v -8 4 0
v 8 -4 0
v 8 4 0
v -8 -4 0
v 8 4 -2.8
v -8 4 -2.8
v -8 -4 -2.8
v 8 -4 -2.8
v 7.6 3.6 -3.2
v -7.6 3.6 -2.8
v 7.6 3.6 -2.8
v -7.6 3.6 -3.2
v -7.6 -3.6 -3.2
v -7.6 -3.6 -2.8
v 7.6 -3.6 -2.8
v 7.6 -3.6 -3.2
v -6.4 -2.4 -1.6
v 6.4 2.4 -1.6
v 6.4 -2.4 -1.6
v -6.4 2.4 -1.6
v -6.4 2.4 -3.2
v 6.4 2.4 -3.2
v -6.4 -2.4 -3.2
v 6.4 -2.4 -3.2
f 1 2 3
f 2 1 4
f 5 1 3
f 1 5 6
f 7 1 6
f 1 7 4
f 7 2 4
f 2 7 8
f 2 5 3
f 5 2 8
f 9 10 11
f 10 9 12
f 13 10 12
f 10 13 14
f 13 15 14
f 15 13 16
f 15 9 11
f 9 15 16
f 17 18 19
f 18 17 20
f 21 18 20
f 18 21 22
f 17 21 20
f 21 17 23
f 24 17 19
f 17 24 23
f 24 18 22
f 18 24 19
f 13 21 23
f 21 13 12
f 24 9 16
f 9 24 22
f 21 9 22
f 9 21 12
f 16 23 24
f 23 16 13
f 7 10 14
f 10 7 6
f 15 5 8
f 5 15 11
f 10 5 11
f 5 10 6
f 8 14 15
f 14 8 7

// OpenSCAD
// file: ../p/box5.scad
use <../lib.scad>
function ldraw_lib__box5() = [
// 0 Box with 5 Faces and All Edges
// 0 Name: box5.dat
// 0 Author: James Jessiman
// 0 !LDRAW_ORG Primitive UPDATE 2012-01
// 0 !LICENSE Licensed under CC BY 4.0 : see CAreadme.txt
// 
// 0 BFC CERTIFY CCW
  [0,"BFC","CERTIFY"],
  [0,"BFC","CCW"],
// 
// 0 !HISTORY 2002-04-03 [sbliss] Modified for BFC compliance
// 0 !HISTORY 2002-04-25 [PTadmin] Official Update 2002-02
// 0 !HISTORY 2007-06-24 [PTadmin] Header formatted for Contributor Agreement
// 0 !HISTORY 2008-07-01 [PTadmin] Official Update 2008-01
// 0 !HISTORY 2012-02-16 [Philo] Changed to CCW
// 0 !HISTORY 2012-03-30 [PTadmin] Official Update 2012-01
// 
// 
// 2 24 1 1 1 -1 1 1
  [2,24,1,1,1,-1,1,1],
// 2 24 -1 1 1 -1 1 -1
  [2,24,-1,1,1,-1,1,-1],
// 2 24 -1 1 -1 1 1 -1
  [2,24,-1,1,-1,1,1,-1],
// 2 24 1 1 -1 1 1 1
  [2,24,1,1,-1,1,1,1],
// 2 24 1 0 1 -1 0 1
  [2,24,1,0,1,-1,0,1],
// 2 24 -1 0 1 -1 0 -1
  [2,24,-1,0,1,-1,0,-1],
// 2 24 -1 0 -1 1 0 -1
  [2,24,-1,0,-1,1,0,-1],
// 2 24 1 0 -1 1 0 1
  [2,24,1,0,-1,1,0,1],
// 2 24 1 0 1 1 1 1
  [2,24,1,0,1,1,1,1],
// 2 24 -1 0 1 -1 1 1
  [2,24,-1,0,1,-1,1,1],
// 2 24 1 0 -1 1 1 -1
  [2,24,1,0,-1,1,1,-1],
// 2 24 -1 0 -1 -1 1 -1
  [2,24,-1,0,-1,-1,1,-1],
// 4 16 -1 1 1 1 1 1 1 1 -1 -1 1 -1
  [4,16,-1,1,1,1,1,1,1,1,-1,-1,1,-1],
// 4 16 -1 1 1 -1 0 1 1 0 1 1 1 1
  [4,16,-1,1,1,-1,0,1,1,0,1,1,1,1],
// 4 16 -1 1 -1 -1 0 -1 -1 0 1 -1 1 1
  [4,16,-1,1,-1,-1,0,-1,-1,0,1,-1,1,1],
// 4 16 1 1 -1 1 0 -1 -1 0 -1 -1 1 -1
  [4,16,1,1,-1,1,0,-1,-1,0,-1,-1,1,-1],
// 4 16 1 1 1 1 0 1 1 0 -1 1 1 -1
  [4,16,1,1,1,1,0,1,1,0,-1,1,1,-1],
];
module ldraw_lib__box5(step=0, col=false, unit=2/5, alt=false, line=0.2, solid=!$preview)
    makepoly(ldraw_lib__box5(), step=step, col=col, unit=unit, alt=alt, line=line, solid=solid);
ldraw_lib__box5(line=0.2);
// file: ../p/box4.scad
use <../lib.scad>
function ldraw_lib__box4() = [
// 0 Box with 4 Faces (2 Parallel Pairs) and All Edges
// 0 Name: box4.dat
// 0 Author: James Jessiman
// 0 !LDRAW_ORG Primitive UPDATE 2012-01
// 0 !LICENSE Licensed under CC BY 4.0 : see CAreadme.txt
// 
// 0 BFC CERTIFY CCW
  [0,"BFC","CERTIFY"],
  [0,"BFC","CCW"],
// 
// 0 !HISTORY 2002-04-03 [sbliss] Modified for BFC compliance
// 0 !HISTORY 2002-04-25 [PTadmin] Official Update 2002-02
// 0 !HISTORY 2007-06-24 [PTadmin] Header formatted for Contributor Agreement
// 0 !HISTORY 2008-07-01 [PTadmin] Official Update 2008-01
// 0 !HISTORY 2012-02-16 [Philo] Changed to CCW
// 0 !HISTORY 2012-03-30 [PTadmin] Official Update 2012-01
// 
// 
// 2 24 1 1 1 -1 1 1
  [2,24,1,1,1,-1,1,1],
// 2 24 -1 1 1 -1 1 -1
  [2,24,-1,1,1,-1,1,-1],
// 2 24 -1 1 -1 1 1 -1
  [2,24,-1,1,-1,1,1,-1],
// 2 24 1 1 -1 1 1 1
  [2,24,1,1,-1,1,1,1],
// 2 24 1 0 1 -1 0 1
  [2,24,1,0,1,-1,0,1],
// 2 24 -1 0 1 -1 0 -1
  [2,24,-1,0,1,-1,0,-1],
// 2 24 -1 0 -1 1 0 -1
  [2,24,-1,0,-1,1,0,-1],
// 2 24 1 0 -1 1 0 1
  [2,24,1,0,-1,1,0,1],
// 2 24 1 0 1 1 1 1
  [2,24,1,0,1,1,1,1],
// 2 24 -1 0 1 -1 1 1
  [2,24,-1,0,1,-1,1,1],
// 2 24 1 0 -1 1 1 -1
  [2,24,1,0,-1,1,1,-1],
// 2 24 -1 0 -1 -1 1 -1
  [2,24,-1,0,-1,-1,1,-1],
// 4 16 -1 1 1 -1 0 1 1 0 1 1 1 1
  [4,16,-1,1,1,-1,0,1,1,0,1,1,1,1],
// 4 16 -1 1 -1 -1 0 -1 -1 0 1 -1 1 1
  [4,16,-1,1,-1,-1,0,-1,-1,0,1,-1,1,1],
// 4 16 1 1 -1 1 0 -1 -1 0 -1 -1 1 -1
  [4,16,1,1,-1,1,0,-1,-1,0,-1,-1,1,-1],
// 4 16 1 1 1 1 0 1 1 0 -1 1 1 -1
  [4,16,1,1,1,1,0,1,1,0,-1,1,1,-1],
];
module ldraw_lib__box4(step=0, col=false, unit=2/5, alt=false, line=0.2, solid=!$preview)
    makepoly(ldraw_lib__box4(), step=step, col=col, unit=unit, alt=alt, line=line, solid=solid);
ldraw_lib__box4(line=0.2);
// file: s/3069bs01.scad
use <../../lib.scad>
use <../../p/box4.scad>
use <../../p/box5.scad>
function ldraw_lib__s__3069bs01() = [
// 0 ~Tile  1 x  2 with Groove without Top Face
// 0 Name: s\3069bs01.dat
// 0 Author: Santeri Piippo [arezey]
// 0 !LDRAW_ORG Subpart UPDATE 2010-02
// 0 !LICENSE Licensed under CC BY 4.0 : see CAreadme.txt
// 
// 0 BFC CERTIFY CCW
  [0,"BFC","CERTIFY"],
  [0,"BFC","CCW"],
// 
// 0 !HISTORY 2010-07-05 [PTadmin] Official Update 2010-02
// 
// 
// 1 16 0 0 0 20 0 0 0 7 0 0 0 10 box4.dat
  [1,16,0,0,0,20,0,0,0,7,0,0,0,10, ldraw_lib__box4()],
// 1 16 0 7 0 19 0 0 0 1 0 0 0 9 box4.dat
  [1,16,0,7,0,19,0,0,0,1,0,0,0,9, ldraw_lib__box4()],
// 0 BFC INVERTNEXT
  [0,"BFC","INVERTNEXT"],
// 1 16 0 8 0 16 0 0 0 -4 0 0 0 6 box5.dat
  [1,16,0,8,0,16,0,0,0,-4,0,0,0,6, ldraw_lib__box5()],
// 4 16 -19 8 9 -16 8 6 -16 8 -6 -19 8 -9
  [4,16,-19,8,9,-16,8,6,-16,8,-6,-19,8,-9],
// 4 16 19 8 -9 16 8 -6 16 8 6 19 8 9
  [4,16,19,8,-9,16,8,-6,16,8,6,19,8,9],
// 4 16 19 8 9 16 8 6 -16 8 6 -19 8 9
  [4,16,19,8,9,16,8,6,-16,8,6,-19,8,9],
// 4 16 -19 8 -9 -16 8 -6 16 8 -6 19 8 -9
  [4,16,-19,8,-9,-16,8,-6,16,8,-6,19,8,-9],
// 4 16 -20 7 10 -19 7 9 -19 7 -9 -20 7 -10
  [4,16,-20,7,10,-19,7,9,-19,7,-9,-20,7,-10],
// 4 16 20 7 -10 19 7 -9 19 7 9 20 7 10
  [4,16,20,7,-10,19,7,-9,19,7,9,20,7,10],
// 4 16 20 7 10 19 7 9 -19 7 9 -20 7 10
  [4,16,20,7,10,19,7,9,-19,7,9,-20,7,10],
// 4 16 -20 7 -10 -19 7 -9 19 7 -9 20 7 -10
  [4,16,-20,7,-10,-19,7,-9,19,7,-9,20,7,-10],
// 0 //
];
module ldraw_lib__s__3069bs01(step=0, col=false, unit=2/5, alt=false, line=0.2, solid=!$preview)
    makepoly(ldraw_lib__s__3069bs01(), step=step, col=col, unit=unit, alt=alt, line=line, solid=solid);
ldraw_lib__s__3069bs01(line=0.2);
// file: 3069b.scad
use <../lib.scad>
use <s/3069bs01.scad>
function ldraw_lib__3069b() = [
// 0 Tile  1 x  2 with Groove
// 0 Name: 3069b.dat
// 0 Author: Santeri Piippo [arezey]
// 0 !LDRAW_ORG Part UPDATE 2010-02
// 0 !LICENSE Licensed under CC BY 4.0 : see CAreadme.txt
// 
// 0 BFC CERTIFY CCW
  [0,"BFC","CERTIFY"],
  [0,"BFC","CCW"],
// 
// 0 !HISTORY 2010-07-05 [PTadmin] Official Update 2010-02
// 
// 
// 4 16 20 0 -10 20 0 10 -20 0 10 -20 0 -10
  [4,16,20,0,-10,20,0,10,-20,0,10,-20,0,-10],
// 1 16 0 0 0 1 0 0 0 1 0 0 0 1 s\3069bs01.dat
  [1,16,0,0,0,1,0,0,0,1,0,0,0,1, ldraw_lib__s__3069bs01()],
// 0 //
];
module ldraw_lib__3069b(step=0, col=false, unit=2/5, alt=false, line=0.2, solid=!$preview)
    makepoly(ldraw_lib__3069b(), step=step, col=col, unit=unit, alt=alt, line=line, solid=solid);
ldraw_lib__3069b(line=0.2);
// main file
use <../lib.scad>
use <3069b.scad>
function ldraw_lib__306901() = [
// 0 ~_Tile  1 x  2 with Groove White (Obsolete)
// 0 Name: 306901.dat
// 0 Author: Michael Heidemann [mikeheide]
// 0 !LDRAW_ORG Part Physical_Colour UPDATE 2019-02
// 0 !LICENSE Licensed under CC BY 4.0 : see CAreadme.txt
// 
// 0 BFC CERTIFY CCW
  [0,"BFC","CERTIFY"],
  [0,"BFC","CCW"],
// 
// 0 !CATEGORY Obsolete
// 
// 0 !HISTORY 2010-12-31 [PTadmin] Official Update 2010-03
// 0 !HISTORY 2019-07-22 [Holly-Wood] Obsoleted per decision not to include physical colour parts
// 0 !HISTORY 2019-09-09 [PTadmin] Official Update 2019-02
// 
// 
// 0 // This file is a "shortcut" with the correct number for the actual
// 0 // colouring of the part (White).
// 
// 1 15 0 0 0 1 0 0 0 1 0 0 0 1 3069b.dat
  [1,15,0,0,0,1,0,0,0,1,0,0,0,1, ldraw_lib__3069b()],
];
module ldraw_lib__306901(step=0, col=false, unit=2/5, alt=false, line=0.2, solid=!$preview)
    makepoly(ldraw_lib__306901(), step=step, col=col, unit=unit, alt=alt, line=line, solid=solid);
ldraw_lib__306901(line=0.2);
